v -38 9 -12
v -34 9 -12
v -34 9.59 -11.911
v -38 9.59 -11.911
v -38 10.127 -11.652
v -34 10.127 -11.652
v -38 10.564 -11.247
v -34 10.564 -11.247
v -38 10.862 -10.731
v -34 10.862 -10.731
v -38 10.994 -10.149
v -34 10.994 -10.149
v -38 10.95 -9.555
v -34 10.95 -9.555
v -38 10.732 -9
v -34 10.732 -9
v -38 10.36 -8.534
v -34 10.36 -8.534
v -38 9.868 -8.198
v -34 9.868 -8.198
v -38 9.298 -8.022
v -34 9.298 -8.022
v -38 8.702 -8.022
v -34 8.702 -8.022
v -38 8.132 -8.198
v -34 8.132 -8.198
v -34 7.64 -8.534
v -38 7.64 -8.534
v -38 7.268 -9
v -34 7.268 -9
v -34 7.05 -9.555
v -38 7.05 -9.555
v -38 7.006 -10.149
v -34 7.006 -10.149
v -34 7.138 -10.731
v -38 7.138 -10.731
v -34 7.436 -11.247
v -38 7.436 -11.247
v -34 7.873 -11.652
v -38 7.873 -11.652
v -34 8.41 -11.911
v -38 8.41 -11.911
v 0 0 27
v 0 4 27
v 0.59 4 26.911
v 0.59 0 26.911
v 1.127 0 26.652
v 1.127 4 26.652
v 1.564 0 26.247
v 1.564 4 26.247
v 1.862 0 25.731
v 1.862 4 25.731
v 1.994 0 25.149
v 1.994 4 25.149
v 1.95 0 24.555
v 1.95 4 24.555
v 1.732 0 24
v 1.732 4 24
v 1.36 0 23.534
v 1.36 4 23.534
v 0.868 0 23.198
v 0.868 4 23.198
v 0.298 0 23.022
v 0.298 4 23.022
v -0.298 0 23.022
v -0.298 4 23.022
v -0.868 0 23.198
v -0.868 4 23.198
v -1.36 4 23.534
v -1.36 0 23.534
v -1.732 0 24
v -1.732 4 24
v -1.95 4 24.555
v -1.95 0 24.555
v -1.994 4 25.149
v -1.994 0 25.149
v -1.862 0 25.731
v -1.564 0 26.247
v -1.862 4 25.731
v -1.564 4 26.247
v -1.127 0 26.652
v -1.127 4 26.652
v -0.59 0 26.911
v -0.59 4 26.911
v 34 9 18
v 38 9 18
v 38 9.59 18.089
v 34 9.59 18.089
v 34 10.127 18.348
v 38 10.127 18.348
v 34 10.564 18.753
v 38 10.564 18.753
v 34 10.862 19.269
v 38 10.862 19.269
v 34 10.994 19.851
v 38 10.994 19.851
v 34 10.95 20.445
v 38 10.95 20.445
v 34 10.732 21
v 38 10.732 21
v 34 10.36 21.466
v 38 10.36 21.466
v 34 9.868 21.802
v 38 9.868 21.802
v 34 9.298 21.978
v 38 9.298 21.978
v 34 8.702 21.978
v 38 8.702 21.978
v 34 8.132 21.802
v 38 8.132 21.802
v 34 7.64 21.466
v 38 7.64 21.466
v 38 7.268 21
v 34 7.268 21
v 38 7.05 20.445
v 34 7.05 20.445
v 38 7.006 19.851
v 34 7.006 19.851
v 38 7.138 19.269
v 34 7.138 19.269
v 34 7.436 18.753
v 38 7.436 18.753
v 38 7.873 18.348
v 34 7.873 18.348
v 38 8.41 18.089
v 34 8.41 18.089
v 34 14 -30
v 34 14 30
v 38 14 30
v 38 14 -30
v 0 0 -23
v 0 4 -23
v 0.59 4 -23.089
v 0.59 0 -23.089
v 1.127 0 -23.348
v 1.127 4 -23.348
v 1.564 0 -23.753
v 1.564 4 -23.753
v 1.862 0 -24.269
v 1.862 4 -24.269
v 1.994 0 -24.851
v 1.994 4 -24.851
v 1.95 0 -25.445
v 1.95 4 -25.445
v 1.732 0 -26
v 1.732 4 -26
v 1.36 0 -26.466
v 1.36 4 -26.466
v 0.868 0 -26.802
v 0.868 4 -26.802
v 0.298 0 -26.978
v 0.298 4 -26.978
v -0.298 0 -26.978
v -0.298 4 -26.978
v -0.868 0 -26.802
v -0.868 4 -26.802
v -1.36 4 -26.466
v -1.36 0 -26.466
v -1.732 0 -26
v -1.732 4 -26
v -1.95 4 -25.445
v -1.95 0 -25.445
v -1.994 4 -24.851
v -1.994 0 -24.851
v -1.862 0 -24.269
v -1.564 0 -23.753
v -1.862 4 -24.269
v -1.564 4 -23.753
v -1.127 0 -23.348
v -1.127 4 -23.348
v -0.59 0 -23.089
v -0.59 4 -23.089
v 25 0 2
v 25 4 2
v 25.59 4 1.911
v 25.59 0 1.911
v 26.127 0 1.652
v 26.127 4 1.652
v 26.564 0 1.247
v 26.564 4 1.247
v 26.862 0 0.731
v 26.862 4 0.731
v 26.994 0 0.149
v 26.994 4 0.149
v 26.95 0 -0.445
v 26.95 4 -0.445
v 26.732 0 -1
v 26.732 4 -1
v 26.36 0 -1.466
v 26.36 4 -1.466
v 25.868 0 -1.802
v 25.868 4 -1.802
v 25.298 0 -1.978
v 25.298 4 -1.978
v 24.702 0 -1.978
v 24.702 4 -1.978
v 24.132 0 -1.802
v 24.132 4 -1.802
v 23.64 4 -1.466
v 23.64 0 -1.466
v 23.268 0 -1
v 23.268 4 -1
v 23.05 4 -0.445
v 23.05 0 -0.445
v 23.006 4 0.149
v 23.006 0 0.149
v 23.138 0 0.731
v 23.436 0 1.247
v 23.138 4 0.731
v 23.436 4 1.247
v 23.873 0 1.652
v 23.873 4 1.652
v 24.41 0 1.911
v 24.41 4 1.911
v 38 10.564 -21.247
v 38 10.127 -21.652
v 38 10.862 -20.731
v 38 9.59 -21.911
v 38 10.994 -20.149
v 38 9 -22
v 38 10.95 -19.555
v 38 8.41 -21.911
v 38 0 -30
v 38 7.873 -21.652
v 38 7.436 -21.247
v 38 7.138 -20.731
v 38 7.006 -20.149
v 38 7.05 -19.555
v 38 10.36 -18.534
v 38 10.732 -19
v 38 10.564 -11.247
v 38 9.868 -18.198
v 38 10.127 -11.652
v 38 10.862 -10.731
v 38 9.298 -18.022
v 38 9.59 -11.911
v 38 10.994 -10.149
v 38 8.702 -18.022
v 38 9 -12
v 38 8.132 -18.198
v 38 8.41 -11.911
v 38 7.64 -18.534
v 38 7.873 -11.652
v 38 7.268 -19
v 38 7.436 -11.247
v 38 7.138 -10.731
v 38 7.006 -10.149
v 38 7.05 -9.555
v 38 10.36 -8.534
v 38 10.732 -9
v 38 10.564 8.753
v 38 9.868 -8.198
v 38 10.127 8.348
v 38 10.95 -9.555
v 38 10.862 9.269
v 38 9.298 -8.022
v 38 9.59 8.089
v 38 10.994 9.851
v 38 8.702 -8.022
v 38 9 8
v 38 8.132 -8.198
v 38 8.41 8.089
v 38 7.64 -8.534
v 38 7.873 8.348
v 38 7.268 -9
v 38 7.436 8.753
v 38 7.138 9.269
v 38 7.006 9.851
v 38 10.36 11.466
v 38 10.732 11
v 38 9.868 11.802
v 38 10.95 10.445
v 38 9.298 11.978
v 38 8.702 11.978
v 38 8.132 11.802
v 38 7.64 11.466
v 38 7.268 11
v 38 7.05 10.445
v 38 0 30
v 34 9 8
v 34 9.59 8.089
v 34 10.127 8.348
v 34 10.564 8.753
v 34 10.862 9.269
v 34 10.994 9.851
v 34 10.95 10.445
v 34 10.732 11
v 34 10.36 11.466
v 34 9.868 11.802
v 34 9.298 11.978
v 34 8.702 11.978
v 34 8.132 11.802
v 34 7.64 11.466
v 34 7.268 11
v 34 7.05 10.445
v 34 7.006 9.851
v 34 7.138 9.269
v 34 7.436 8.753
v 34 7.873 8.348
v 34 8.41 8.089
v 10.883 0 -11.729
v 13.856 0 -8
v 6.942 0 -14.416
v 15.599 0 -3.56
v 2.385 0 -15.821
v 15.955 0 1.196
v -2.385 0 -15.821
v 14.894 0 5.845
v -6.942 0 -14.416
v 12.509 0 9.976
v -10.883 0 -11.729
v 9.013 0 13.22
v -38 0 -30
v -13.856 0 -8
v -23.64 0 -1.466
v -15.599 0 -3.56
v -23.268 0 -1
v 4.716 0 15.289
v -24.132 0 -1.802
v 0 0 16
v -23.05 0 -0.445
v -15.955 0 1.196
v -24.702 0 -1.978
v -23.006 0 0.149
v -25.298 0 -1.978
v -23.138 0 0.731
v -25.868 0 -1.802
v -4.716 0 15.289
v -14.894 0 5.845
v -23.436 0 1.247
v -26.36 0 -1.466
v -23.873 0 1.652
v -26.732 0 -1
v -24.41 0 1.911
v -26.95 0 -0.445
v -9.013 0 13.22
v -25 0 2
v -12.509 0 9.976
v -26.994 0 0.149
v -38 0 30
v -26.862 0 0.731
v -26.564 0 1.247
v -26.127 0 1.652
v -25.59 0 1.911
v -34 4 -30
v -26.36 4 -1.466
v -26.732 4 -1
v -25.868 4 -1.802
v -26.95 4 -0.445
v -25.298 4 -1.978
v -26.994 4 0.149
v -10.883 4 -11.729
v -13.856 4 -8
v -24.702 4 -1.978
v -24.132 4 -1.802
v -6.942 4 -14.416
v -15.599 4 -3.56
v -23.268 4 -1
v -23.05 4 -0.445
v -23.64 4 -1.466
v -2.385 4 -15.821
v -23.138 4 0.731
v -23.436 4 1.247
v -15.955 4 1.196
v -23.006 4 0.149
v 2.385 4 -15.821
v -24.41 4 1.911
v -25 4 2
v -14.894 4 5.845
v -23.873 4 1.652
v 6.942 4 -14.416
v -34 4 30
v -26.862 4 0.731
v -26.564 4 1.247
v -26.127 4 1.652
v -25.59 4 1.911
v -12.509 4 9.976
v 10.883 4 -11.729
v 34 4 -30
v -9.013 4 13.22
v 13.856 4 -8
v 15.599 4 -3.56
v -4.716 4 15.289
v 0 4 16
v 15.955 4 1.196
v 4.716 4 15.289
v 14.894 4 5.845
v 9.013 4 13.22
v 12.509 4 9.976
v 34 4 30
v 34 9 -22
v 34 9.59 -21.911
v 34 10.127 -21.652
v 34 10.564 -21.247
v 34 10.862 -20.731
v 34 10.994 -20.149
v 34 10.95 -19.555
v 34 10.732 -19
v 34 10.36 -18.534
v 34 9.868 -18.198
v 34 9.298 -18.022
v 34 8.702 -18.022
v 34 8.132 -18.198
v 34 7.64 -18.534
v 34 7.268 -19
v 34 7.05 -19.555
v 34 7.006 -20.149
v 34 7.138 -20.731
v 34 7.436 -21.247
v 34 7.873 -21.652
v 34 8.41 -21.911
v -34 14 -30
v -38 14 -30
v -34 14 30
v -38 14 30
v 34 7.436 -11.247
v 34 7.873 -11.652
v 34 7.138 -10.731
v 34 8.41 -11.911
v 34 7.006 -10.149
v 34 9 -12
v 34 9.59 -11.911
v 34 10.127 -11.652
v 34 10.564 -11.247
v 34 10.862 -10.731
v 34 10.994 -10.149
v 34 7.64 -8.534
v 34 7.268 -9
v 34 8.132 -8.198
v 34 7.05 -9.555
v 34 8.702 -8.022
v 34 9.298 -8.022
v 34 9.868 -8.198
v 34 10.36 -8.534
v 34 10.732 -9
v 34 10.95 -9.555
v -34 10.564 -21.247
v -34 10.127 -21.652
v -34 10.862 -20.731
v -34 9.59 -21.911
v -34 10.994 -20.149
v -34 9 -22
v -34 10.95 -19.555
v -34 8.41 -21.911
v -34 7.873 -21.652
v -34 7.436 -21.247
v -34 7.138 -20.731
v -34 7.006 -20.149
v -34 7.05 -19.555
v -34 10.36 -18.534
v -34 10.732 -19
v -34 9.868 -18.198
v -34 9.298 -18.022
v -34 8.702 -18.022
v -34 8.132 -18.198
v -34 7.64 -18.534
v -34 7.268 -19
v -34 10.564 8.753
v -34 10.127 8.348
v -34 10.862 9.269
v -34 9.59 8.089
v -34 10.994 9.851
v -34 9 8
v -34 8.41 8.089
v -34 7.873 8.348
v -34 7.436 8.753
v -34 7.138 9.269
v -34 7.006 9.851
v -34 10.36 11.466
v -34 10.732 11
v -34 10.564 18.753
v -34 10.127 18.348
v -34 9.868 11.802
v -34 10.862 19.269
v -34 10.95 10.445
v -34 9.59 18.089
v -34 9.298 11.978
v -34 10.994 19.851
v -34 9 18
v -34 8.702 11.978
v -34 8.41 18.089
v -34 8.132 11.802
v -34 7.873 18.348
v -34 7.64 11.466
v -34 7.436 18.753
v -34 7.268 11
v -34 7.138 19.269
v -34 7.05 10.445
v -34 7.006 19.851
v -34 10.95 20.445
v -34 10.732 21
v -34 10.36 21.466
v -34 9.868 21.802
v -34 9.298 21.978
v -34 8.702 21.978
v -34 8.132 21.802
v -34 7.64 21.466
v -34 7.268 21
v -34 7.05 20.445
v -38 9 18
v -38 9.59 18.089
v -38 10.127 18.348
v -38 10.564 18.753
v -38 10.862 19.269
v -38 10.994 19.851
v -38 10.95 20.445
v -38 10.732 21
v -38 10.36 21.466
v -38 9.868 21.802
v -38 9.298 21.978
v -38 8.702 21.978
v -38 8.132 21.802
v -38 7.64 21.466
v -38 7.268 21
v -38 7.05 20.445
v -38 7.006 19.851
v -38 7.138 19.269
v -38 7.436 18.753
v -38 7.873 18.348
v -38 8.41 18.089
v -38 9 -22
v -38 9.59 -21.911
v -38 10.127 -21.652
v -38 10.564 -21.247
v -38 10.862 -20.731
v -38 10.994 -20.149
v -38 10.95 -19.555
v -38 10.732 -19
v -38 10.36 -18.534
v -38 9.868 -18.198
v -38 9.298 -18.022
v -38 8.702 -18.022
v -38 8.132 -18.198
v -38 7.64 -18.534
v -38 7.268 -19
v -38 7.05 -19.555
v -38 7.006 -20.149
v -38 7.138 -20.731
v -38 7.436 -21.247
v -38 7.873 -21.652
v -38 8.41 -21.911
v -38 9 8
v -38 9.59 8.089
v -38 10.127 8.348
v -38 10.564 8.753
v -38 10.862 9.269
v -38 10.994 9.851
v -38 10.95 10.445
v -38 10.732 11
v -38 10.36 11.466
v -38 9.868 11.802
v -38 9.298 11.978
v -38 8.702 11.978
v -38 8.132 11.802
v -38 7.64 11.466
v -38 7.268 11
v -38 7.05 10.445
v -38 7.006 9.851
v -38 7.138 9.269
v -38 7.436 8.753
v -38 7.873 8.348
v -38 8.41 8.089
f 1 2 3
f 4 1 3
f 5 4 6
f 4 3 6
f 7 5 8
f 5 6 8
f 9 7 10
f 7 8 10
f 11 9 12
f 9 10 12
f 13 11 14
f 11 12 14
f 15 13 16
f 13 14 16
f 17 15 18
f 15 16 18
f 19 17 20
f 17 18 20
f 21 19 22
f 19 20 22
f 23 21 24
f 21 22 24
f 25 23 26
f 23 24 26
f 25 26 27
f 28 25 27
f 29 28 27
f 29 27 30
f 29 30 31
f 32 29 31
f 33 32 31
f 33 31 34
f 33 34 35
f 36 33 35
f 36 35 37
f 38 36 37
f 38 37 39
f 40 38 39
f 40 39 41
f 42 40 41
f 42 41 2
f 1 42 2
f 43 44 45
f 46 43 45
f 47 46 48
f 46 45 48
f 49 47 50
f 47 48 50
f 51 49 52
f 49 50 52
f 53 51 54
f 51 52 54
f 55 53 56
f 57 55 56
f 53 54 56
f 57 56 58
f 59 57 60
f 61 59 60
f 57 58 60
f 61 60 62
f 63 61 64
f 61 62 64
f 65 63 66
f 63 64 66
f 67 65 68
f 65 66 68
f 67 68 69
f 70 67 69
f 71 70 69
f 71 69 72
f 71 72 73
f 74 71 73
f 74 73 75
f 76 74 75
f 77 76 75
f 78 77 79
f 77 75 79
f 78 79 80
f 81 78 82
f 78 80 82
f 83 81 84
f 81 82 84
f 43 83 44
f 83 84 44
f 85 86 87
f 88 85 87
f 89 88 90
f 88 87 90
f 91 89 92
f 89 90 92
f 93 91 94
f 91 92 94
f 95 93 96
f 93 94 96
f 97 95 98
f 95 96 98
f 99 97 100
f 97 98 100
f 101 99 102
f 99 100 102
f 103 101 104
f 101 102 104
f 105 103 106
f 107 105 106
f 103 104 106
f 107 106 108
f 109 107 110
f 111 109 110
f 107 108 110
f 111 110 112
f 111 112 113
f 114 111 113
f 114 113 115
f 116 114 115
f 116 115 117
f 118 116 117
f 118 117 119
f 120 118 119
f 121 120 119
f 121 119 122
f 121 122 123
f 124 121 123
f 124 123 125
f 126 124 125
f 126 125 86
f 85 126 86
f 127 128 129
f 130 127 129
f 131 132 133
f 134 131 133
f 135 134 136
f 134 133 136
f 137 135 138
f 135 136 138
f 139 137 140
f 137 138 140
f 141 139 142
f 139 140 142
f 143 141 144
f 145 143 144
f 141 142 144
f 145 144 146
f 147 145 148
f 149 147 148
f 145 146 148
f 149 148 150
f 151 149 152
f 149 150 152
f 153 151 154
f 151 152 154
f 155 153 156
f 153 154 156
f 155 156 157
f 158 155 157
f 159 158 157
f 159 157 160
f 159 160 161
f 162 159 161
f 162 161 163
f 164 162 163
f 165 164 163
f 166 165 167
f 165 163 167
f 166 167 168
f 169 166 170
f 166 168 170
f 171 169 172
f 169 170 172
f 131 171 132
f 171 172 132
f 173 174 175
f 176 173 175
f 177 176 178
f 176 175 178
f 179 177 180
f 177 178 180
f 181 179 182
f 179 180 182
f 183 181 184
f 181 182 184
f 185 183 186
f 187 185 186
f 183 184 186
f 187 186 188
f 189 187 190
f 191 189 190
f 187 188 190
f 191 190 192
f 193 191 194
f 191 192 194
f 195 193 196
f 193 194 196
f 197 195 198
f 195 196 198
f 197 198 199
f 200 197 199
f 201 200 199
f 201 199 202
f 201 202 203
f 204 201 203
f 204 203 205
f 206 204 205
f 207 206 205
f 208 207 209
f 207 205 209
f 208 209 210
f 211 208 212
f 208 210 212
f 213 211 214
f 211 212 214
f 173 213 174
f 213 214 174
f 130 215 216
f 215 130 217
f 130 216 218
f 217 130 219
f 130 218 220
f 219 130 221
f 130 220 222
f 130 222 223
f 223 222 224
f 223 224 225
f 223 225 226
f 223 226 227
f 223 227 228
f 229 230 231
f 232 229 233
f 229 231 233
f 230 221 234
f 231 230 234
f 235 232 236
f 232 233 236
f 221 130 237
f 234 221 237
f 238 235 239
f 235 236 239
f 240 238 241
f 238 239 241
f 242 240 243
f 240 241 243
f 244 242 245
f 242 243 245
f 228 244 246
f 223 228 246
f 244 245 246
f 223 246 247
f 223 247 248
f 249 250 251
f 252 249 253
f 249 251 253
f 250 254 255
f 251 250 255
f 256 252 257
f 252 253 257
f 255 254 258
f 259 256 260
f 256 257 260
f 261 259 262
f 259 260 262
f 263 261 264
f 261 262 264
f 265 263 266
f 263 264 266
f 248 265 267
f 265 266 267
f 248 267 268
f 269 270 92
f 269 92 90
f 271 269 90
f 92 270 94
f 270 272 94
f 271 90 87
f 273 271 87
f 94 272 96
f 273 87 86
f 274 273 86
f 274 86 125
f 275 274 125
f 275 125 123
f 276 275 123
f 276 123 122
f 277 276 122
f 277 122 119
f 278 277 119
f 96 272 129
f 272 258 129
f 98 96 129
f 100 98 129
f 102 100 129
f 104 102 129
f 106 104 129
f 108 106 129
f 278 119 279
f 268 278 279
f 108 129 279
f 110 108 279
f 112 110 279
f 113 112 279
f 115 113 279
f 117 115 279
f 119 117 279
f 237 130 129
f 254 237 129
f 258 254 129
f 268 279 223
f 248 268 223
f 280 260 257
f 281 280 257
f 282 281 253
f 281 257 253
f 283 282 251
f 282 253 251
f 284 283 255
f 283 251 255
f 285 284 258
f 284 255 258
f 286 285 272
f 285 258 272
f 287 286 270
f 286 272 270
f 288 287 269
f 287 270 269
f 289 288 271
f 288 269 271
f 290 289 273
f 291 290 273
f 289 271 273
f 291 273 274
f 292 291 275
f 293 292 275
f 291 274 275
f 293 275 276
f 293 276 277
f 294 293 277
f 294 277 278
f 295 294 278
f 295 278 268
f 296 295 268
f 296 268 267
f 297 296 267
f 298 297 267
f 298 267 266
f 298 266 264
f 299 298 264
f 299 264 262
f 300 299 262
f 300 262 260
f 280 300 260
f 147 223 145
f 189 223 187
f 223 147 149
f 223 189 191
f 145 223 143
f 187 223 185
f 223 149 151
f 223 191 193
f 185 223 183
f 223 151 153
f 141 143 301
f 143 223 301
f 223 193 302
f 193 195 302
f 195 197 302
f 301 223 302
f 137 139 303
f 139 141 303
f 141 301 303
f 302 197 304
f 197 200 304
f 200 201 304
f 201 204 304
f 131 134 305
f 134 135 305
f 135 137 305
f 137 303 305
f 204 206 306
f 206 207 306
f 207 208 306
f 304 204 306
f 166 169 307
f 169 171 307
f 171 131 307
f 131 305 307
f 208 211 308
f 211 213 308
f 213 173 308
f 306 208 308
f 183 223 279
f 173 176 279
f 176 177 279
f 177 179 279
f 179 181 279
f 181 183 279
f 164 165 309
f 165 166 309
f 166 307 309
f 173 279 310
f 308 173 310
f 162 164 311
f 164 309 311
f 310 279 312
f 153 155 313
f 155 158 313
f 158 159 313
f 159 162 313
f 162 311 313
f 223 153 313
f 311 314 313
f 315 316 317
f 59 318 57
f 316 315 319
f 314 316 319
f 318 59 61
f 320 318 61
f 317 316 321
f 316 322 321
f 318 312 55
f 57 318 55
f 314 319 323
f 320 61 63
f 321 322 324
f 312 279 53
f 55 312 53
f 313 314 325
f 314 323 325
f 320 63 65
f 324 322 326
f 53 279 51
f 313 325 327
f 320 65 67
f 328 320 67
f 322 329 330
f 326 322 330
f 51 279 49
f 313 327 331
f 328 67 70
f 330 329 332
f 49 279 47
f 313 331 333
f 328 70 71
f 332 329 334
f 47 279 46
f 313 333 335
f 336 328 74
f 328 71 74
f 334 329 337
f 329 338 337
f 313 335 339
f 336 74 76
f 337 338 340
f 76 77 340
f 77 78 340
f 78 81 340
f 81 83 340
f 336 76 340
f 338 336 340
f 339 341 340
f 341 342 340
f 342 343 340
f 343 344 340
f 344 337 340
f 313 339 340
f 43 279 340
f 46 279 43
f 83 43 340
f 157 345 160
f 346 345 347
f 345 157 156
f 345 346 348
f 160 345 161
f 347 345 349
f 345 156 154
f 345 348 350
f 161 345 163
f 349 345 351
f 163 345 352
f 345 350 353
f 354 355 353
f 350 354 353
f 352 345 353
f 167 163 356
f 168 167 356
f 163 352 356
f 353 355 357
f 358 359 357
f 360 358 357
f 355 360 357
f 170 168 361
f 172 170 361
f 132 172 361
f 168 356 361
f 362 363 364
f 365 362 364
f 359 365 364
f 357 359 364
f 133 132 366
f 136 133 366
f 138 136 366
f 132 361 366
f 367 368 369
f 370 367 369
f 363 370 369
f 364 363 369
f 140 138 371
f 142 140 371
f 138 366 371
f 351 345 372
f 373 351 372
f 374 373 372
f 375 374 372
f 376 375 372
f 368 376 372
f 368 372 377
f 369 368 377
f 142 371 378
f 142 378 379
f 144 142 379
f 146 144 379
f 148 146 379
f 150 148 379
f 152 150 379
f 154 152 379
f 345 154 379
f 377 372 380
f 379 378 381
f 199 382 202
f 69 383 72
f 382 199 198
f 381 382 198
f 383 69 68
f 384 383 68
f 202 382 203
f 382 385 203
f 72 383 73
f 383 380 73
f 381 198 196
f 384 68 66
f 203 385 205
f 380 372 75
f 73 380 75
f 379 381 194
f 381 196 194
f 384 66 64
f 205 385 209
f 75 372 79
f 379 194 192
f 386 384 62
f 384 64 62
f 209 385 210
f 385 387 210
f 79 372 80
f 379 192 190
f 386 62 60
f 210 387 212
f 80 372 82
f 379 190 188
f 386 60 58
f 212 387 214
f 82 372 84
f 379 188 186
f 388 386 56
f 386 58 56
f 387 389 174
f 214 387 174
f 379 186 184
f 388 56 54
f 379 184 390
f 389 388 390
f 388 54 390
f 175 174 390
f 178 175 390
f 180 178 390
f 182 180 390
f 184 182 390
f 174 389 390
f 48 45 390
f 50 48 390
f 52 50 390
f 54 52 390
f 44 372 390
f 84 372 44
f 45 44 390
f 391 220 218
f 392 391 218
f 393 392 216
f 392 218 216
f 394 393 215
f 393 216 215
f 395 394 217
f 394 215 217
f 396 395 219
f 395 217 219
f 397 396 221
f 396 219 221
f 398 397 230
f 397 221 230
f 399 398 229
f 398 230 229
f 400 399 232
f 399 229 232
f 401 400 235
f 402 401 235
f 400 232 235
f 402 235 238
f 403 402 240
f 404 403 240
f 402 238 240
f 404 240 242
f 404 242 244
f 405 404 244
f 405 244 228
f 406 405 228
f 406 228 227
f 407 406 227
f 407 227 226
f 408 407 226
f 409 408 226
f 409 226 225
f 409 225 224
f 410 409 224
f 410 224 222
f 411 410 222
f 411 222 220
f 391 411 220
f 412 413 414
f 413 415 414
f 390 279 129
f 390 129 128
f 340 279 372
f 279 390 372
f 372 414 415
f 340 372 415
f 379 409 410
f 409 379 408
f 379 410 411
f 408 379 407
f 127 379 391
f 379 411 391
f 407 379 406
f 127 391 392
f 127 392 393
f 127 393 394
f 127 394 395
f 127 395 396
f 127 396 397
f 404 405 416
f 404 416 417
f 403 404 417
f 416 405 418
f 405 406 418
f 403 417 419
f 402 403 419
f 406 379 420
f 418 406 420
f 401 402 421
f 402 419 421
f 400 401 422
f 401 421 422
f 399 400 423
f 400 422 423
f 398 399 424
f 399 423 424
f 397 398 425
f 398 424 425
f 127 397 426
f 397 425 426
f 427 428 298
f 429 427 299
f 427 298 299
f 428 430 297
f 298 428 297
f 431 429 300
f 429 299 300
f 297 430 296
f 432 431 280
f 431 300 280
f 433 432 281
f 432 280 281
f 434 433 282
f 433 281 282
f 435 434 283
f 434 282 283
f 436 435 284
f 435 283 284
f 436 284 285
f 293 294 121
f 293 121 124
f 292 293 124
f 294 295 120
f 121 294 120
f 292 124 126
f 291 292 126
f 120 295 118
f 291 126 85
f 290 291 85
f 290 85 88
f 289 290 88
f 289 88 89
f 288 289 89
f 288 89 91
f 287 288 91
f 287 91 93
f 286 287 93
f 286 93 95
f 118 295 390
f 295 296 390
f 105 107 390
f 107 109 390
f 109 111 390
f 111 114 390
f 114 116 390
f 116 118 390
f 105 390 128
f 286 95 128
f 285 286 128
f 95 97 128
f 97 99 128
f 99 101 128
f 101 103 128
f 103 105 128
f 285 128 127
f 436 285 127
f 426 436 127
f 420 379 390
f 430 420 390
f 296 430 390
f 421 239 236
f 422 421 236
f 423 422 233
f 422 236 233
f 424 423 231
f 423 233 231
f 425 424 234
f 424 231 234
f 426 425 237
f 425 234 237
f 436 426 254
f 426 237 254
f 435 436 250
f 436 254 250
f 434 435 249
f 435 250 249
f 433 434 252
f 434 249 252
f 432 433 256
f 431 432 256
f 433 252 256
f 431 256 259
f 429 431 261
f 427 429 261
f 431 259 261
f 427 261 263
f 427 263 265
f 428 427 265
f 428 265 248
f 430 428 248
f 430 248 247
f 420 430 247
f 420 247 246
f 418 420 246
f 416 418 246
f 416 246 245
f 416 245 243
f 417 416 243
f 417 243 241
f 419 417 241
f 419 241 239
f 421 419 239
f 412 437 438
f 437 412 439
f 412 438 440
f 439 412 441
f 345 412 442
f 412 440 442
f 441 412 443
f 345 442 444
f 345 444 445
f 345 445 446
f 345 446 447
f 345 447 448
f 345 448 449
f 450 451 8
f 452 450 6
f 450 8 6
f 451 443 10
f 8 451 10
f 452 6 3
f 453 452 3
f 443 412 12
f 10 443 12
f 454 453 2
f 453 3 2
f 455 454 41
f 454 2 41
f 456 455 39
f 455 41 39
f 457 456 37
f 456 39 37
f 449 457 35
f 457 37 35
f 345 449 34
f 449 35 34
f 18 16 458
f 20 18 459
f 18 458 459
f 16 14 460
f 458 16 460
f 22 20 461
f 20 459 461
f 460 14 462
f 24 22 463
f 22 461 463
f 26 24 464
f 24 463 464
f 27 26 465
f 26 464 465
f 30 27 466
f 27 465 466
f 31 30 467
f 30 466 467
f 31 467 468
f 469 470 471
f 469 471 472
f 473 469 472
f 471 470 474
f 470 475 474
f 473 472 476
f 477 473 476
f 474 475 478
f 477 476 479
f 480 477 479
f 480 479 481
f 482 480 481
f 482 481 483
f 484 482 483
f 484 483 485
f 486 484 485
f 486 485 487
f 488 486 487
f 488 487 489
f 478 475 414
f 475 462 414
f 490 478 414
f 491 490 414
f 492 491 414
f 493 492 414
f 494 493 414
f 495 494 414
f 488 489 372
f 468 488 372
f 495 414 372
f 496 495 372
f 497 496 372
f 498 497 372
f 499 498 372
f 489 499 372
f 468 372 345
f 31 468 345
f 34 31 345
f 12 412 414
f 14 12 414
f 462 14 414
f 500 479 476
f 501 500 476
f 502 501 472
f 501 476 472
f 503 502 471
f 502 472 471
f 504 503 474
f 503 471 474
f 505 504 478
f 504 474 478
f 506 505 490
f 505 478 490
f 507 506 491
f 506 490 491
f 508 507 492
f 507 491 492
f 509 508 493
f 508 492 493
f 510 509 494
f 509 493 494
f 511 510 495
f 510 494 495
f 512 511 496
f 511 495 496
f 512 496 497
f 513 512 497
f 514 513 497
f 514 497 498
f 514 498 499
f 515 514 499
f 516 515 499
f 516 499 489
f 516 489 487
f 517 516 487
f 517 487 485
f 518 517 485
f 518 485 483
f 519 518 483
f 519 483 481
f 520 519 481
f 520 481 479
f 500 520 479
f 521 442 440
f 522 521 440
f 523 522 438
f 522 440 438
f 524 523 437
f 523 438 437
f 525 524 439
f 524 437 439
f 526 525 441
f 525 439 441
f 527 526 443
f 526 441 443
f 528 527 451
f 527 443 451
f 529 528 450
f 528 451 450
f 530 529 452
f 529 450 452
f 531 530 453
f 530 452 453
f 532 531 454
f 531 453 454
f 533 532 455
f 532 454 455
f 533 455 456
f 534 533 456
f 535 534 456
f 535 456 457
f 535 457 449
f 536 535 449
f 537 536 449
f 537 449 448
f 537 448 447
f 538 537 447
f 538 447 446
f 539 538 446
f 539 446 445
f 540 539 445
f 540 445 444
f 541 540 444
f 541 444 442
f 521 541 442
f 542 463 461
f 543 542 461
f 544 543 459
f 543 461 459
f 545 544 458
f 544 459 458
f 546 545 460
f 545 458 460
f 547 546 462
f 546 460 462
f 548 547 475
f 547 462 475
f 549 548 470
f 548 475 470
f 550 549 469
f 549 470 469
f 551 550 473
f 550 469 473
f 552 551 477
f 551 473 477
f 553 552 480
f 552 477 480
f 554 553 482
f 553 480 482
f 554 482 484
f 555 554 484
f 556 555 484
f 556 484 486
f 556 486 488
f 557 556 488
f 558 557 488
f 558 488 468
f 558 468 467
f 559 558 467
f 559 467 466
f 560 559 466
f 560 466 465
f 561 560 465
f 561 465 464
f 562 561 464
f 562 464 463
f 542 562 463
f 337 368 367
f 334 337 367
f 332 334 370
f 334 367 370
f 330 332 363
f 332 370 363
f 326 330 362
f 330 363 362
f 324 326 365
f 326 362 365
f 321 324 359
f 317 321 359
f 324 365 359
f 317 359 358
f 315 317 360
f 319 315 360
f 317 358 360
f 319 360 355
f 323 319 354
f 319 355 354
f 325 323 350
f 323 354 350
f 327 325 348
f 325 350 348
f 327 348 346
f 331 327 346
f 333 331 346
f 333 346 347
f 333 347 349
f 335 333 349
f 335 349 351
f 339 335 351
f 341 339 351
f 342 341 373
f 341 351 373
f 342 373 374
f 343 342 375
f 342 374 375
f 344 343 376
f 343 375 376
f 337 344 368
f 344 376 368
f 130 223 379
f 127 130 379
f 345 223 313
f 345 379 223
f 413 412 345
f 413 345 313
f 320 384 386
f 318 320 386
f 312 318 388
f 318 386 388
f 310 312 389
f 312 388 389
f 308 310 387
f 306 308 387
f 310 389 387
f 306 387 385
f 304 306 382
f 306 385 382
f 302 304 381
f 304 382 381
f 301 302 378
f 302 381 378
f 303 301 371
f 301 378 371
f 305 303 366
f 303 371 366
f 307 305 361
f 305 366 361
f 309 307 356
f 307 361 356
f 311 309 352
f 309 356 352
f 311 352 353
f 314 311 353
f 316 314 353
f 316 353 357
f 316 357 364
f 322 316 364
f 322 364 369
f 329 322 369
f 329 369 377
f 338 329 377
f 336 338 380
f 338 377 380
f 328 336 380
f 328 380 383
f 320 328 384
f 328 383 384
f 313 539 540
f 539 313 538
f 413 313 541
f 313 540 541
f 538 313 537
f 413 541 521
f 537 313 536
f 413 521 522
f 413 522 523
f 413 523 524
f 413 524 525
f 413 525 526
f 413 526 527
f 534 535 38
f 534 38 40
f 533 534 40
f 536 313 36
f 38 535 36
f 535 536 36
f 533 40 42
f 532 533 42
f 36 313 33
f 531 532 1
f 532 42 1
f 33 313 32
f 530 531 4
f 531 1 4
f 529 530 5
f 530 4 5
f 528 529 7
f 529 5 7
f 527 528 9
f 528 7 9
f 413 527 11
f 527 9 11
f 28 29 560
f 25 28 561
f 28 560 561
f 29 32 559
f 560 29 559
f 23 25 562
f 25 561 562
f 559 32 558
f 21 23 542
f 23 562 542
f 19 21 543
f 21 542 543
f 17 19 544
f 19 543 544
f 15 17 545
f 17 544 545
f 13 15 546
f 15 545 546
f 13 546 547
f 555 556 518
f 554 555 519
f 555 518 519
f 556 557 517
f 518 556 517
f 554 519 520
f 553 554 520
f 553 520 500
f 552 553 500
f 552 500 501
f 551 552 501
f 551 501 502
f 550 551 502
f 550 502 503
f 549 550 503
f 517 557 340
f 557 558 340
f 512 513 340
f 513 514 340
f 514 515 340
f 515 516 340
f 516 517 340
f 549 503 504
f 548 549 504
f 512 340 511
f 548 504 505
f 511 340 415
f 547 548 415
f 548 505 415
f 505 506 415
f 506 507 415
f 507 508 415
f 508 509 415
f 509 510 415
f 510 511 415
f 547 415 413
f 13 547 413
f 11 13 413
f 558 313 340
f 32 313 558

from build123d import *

# Parameters (mm, degrees)
EXTRUDE_1_DEPTH     = 30
CUT_EXTRUDE_1_REACH = 84.898
SKETCH_2_R          = 2
SKETCH_3_R          = 16
SKETCH_3_R_2        = 2
CUT_EXTRUDE_2_DEPTH = 4


with BuildPart() as part:
    # 草图1 → 凸台-拉伸1 (new, symmetric)
    with BuildSketch(Plane.XY):
        Polygon((38, 0), (-38, 0), (-38, 14), (-34, 14), (-34, 4), (34, 4), (34, 14), (38, 14), align=None)
    extrude(amount=EXTRUDE_1_DEPTH, both=True)

    # 切除-拉伸1: up to this face of the body (flat: up to its plane)
    cut_extrude_1_end = Plane(part.part.faces().sort_by_distance((-38, 7, 0))[0])
    # 草图2 → 切除-拉伸1 (cut, up to the picked face)
    with BuildSketch(Plane(origin=(38, 0, 0), x_dir=(0, 0, -1), z_dir=(1, 0, 0)), mode=Mode.PRIVATE) as cut_extrude_1_sk1:
        with Locations((-20, 9)):
            Circle(SKETCH_2_R)
    cut_extrude_1_tool1 = split(extrude(cut_extrude_1_sk1.sketch, amount=-CUT_EXTRUDE_1_REACH, mode=Mode.PRIVATE), bisect_by=cut_extrude_1_end, keep=Keep.BOTH, mode=Mode.PRIVATE)
    # 草图2 → 切除-拉伸1 (cut, up to the picked face)
    with BuildSketch(Plane(origin=(38, 0, 0), x_dir=(0, 0, -1), z_dir=(1, 0, 0)), mode=Mode.PRIVATE) as cut_extrude_1_sk2:
        with Locations((-10, 9)):
            Circle(SKETCH_2_R)
    cut_extrude_1_tool2 = split(extrude(cut_extrude_1_sk2.sketch, amount=-CUT_EXTRUDE_1_REACH, mode=Mode.PRIVATE), bisect_by=cut_extrude_1_end, keep=Keep.BOTH, mode=Mode.PRIVATE)
    # 草图2 → 切除-拉伸1 (cut, up to the picked face)
    with BuildSketch(Plane(origin=(38, 0, 0), x_dir=(0, 0, -1), z_dir=(1, 0, 0)), mode=Mode.PRIVATE) as cut_extrude_1_sk3:
        with Locations((10, 9)):
            Circle(SKETCH_2_R)
    cut_extrude_1_tool3 = split(extrude(cut_extrude_1_sk3.sketch, amount=-CUT_EXTRUDE_1_REACH, mode=Mode.PRIVATE), bisect_by=cut_extrude_1_end, keep=Keep.BOTH, mode=Mode.PRIVATE)
    # 草图2 → 切除-拉伸1 (cut, up to the picked face)
    with BuildSketch(Plane(origin=(38, 0, 0), x_dir=(0, 0, -1), z_dir=(1, 0, 0)), mode=Mode.PRIVATE) as cut_extrude_1_sk4:
        with Locations((20, 9)):
            Circle(SKETCH_2_R)
    cut_extrude_1_tool4 = split(extrude(cut_extrude_1_sk4.sketch, amount=-CUT_EXTRUDE_1_REACH, mode=Mode.PRIVATE), bisect_by=cut_extrude_1_end, keep=Keep.BOTH, mode=Mode.PRIVATE)
    add(cut_extrude_1_tool1.solids().sort_by(Axis((38, 9, 20), (-1, 0, 0)))[0], mode=Mode.SUBTRACT)
    add(cut_extrude_1_tool2.solids().sort_by(Axis((38, 9, 10), (-1, 0, 0)))[0], mode=Mode.SUBTRACT)
    add(cut_extrude_1_tool3.solids().sort_by(Axis((38, 9, -10), (-1, 0, 0)))[0], mode=Mode.SUBTRACT)
    add(cut_extrude_1_tool4.solids().sort_by(Axis((38, 9, -20), (-1, 0, 0)))[0], mode=Mode.SUBTRACT)

    # 草图3 → 切除-拉伸2 (cut)
    with BuildSketch(Plane(origin=(0, 4, 0), x_dir=(1, 0, 0), z_dir=(0, 1, 0))):
        with Locations(Location((0, 0, 0), (0, 0, 270))):
            Circle(SKETCH_3_R)
        with Locations(Location((0, 25, 0), (0, 0, 270))):
            Circle(SKETCH_3_R_2)
        with Locations(Location((25, 0, 0), (0, 0, 270))):
            Circle(SKETCH_3_R_2)
        with Locations(Location((0, -25, 0), (0, 0, 270))):
            Circle(SKETCH_3_R_2)
        with Locations(Location((-25, 0, 0), (0, 0, 270))):
            Circle(SKETCH_3_R_2)
    extrude(amount=-CUT_EXTRUDE_2_DEPTH, mode=Mode.SUBTRACT)


solid = part.part
